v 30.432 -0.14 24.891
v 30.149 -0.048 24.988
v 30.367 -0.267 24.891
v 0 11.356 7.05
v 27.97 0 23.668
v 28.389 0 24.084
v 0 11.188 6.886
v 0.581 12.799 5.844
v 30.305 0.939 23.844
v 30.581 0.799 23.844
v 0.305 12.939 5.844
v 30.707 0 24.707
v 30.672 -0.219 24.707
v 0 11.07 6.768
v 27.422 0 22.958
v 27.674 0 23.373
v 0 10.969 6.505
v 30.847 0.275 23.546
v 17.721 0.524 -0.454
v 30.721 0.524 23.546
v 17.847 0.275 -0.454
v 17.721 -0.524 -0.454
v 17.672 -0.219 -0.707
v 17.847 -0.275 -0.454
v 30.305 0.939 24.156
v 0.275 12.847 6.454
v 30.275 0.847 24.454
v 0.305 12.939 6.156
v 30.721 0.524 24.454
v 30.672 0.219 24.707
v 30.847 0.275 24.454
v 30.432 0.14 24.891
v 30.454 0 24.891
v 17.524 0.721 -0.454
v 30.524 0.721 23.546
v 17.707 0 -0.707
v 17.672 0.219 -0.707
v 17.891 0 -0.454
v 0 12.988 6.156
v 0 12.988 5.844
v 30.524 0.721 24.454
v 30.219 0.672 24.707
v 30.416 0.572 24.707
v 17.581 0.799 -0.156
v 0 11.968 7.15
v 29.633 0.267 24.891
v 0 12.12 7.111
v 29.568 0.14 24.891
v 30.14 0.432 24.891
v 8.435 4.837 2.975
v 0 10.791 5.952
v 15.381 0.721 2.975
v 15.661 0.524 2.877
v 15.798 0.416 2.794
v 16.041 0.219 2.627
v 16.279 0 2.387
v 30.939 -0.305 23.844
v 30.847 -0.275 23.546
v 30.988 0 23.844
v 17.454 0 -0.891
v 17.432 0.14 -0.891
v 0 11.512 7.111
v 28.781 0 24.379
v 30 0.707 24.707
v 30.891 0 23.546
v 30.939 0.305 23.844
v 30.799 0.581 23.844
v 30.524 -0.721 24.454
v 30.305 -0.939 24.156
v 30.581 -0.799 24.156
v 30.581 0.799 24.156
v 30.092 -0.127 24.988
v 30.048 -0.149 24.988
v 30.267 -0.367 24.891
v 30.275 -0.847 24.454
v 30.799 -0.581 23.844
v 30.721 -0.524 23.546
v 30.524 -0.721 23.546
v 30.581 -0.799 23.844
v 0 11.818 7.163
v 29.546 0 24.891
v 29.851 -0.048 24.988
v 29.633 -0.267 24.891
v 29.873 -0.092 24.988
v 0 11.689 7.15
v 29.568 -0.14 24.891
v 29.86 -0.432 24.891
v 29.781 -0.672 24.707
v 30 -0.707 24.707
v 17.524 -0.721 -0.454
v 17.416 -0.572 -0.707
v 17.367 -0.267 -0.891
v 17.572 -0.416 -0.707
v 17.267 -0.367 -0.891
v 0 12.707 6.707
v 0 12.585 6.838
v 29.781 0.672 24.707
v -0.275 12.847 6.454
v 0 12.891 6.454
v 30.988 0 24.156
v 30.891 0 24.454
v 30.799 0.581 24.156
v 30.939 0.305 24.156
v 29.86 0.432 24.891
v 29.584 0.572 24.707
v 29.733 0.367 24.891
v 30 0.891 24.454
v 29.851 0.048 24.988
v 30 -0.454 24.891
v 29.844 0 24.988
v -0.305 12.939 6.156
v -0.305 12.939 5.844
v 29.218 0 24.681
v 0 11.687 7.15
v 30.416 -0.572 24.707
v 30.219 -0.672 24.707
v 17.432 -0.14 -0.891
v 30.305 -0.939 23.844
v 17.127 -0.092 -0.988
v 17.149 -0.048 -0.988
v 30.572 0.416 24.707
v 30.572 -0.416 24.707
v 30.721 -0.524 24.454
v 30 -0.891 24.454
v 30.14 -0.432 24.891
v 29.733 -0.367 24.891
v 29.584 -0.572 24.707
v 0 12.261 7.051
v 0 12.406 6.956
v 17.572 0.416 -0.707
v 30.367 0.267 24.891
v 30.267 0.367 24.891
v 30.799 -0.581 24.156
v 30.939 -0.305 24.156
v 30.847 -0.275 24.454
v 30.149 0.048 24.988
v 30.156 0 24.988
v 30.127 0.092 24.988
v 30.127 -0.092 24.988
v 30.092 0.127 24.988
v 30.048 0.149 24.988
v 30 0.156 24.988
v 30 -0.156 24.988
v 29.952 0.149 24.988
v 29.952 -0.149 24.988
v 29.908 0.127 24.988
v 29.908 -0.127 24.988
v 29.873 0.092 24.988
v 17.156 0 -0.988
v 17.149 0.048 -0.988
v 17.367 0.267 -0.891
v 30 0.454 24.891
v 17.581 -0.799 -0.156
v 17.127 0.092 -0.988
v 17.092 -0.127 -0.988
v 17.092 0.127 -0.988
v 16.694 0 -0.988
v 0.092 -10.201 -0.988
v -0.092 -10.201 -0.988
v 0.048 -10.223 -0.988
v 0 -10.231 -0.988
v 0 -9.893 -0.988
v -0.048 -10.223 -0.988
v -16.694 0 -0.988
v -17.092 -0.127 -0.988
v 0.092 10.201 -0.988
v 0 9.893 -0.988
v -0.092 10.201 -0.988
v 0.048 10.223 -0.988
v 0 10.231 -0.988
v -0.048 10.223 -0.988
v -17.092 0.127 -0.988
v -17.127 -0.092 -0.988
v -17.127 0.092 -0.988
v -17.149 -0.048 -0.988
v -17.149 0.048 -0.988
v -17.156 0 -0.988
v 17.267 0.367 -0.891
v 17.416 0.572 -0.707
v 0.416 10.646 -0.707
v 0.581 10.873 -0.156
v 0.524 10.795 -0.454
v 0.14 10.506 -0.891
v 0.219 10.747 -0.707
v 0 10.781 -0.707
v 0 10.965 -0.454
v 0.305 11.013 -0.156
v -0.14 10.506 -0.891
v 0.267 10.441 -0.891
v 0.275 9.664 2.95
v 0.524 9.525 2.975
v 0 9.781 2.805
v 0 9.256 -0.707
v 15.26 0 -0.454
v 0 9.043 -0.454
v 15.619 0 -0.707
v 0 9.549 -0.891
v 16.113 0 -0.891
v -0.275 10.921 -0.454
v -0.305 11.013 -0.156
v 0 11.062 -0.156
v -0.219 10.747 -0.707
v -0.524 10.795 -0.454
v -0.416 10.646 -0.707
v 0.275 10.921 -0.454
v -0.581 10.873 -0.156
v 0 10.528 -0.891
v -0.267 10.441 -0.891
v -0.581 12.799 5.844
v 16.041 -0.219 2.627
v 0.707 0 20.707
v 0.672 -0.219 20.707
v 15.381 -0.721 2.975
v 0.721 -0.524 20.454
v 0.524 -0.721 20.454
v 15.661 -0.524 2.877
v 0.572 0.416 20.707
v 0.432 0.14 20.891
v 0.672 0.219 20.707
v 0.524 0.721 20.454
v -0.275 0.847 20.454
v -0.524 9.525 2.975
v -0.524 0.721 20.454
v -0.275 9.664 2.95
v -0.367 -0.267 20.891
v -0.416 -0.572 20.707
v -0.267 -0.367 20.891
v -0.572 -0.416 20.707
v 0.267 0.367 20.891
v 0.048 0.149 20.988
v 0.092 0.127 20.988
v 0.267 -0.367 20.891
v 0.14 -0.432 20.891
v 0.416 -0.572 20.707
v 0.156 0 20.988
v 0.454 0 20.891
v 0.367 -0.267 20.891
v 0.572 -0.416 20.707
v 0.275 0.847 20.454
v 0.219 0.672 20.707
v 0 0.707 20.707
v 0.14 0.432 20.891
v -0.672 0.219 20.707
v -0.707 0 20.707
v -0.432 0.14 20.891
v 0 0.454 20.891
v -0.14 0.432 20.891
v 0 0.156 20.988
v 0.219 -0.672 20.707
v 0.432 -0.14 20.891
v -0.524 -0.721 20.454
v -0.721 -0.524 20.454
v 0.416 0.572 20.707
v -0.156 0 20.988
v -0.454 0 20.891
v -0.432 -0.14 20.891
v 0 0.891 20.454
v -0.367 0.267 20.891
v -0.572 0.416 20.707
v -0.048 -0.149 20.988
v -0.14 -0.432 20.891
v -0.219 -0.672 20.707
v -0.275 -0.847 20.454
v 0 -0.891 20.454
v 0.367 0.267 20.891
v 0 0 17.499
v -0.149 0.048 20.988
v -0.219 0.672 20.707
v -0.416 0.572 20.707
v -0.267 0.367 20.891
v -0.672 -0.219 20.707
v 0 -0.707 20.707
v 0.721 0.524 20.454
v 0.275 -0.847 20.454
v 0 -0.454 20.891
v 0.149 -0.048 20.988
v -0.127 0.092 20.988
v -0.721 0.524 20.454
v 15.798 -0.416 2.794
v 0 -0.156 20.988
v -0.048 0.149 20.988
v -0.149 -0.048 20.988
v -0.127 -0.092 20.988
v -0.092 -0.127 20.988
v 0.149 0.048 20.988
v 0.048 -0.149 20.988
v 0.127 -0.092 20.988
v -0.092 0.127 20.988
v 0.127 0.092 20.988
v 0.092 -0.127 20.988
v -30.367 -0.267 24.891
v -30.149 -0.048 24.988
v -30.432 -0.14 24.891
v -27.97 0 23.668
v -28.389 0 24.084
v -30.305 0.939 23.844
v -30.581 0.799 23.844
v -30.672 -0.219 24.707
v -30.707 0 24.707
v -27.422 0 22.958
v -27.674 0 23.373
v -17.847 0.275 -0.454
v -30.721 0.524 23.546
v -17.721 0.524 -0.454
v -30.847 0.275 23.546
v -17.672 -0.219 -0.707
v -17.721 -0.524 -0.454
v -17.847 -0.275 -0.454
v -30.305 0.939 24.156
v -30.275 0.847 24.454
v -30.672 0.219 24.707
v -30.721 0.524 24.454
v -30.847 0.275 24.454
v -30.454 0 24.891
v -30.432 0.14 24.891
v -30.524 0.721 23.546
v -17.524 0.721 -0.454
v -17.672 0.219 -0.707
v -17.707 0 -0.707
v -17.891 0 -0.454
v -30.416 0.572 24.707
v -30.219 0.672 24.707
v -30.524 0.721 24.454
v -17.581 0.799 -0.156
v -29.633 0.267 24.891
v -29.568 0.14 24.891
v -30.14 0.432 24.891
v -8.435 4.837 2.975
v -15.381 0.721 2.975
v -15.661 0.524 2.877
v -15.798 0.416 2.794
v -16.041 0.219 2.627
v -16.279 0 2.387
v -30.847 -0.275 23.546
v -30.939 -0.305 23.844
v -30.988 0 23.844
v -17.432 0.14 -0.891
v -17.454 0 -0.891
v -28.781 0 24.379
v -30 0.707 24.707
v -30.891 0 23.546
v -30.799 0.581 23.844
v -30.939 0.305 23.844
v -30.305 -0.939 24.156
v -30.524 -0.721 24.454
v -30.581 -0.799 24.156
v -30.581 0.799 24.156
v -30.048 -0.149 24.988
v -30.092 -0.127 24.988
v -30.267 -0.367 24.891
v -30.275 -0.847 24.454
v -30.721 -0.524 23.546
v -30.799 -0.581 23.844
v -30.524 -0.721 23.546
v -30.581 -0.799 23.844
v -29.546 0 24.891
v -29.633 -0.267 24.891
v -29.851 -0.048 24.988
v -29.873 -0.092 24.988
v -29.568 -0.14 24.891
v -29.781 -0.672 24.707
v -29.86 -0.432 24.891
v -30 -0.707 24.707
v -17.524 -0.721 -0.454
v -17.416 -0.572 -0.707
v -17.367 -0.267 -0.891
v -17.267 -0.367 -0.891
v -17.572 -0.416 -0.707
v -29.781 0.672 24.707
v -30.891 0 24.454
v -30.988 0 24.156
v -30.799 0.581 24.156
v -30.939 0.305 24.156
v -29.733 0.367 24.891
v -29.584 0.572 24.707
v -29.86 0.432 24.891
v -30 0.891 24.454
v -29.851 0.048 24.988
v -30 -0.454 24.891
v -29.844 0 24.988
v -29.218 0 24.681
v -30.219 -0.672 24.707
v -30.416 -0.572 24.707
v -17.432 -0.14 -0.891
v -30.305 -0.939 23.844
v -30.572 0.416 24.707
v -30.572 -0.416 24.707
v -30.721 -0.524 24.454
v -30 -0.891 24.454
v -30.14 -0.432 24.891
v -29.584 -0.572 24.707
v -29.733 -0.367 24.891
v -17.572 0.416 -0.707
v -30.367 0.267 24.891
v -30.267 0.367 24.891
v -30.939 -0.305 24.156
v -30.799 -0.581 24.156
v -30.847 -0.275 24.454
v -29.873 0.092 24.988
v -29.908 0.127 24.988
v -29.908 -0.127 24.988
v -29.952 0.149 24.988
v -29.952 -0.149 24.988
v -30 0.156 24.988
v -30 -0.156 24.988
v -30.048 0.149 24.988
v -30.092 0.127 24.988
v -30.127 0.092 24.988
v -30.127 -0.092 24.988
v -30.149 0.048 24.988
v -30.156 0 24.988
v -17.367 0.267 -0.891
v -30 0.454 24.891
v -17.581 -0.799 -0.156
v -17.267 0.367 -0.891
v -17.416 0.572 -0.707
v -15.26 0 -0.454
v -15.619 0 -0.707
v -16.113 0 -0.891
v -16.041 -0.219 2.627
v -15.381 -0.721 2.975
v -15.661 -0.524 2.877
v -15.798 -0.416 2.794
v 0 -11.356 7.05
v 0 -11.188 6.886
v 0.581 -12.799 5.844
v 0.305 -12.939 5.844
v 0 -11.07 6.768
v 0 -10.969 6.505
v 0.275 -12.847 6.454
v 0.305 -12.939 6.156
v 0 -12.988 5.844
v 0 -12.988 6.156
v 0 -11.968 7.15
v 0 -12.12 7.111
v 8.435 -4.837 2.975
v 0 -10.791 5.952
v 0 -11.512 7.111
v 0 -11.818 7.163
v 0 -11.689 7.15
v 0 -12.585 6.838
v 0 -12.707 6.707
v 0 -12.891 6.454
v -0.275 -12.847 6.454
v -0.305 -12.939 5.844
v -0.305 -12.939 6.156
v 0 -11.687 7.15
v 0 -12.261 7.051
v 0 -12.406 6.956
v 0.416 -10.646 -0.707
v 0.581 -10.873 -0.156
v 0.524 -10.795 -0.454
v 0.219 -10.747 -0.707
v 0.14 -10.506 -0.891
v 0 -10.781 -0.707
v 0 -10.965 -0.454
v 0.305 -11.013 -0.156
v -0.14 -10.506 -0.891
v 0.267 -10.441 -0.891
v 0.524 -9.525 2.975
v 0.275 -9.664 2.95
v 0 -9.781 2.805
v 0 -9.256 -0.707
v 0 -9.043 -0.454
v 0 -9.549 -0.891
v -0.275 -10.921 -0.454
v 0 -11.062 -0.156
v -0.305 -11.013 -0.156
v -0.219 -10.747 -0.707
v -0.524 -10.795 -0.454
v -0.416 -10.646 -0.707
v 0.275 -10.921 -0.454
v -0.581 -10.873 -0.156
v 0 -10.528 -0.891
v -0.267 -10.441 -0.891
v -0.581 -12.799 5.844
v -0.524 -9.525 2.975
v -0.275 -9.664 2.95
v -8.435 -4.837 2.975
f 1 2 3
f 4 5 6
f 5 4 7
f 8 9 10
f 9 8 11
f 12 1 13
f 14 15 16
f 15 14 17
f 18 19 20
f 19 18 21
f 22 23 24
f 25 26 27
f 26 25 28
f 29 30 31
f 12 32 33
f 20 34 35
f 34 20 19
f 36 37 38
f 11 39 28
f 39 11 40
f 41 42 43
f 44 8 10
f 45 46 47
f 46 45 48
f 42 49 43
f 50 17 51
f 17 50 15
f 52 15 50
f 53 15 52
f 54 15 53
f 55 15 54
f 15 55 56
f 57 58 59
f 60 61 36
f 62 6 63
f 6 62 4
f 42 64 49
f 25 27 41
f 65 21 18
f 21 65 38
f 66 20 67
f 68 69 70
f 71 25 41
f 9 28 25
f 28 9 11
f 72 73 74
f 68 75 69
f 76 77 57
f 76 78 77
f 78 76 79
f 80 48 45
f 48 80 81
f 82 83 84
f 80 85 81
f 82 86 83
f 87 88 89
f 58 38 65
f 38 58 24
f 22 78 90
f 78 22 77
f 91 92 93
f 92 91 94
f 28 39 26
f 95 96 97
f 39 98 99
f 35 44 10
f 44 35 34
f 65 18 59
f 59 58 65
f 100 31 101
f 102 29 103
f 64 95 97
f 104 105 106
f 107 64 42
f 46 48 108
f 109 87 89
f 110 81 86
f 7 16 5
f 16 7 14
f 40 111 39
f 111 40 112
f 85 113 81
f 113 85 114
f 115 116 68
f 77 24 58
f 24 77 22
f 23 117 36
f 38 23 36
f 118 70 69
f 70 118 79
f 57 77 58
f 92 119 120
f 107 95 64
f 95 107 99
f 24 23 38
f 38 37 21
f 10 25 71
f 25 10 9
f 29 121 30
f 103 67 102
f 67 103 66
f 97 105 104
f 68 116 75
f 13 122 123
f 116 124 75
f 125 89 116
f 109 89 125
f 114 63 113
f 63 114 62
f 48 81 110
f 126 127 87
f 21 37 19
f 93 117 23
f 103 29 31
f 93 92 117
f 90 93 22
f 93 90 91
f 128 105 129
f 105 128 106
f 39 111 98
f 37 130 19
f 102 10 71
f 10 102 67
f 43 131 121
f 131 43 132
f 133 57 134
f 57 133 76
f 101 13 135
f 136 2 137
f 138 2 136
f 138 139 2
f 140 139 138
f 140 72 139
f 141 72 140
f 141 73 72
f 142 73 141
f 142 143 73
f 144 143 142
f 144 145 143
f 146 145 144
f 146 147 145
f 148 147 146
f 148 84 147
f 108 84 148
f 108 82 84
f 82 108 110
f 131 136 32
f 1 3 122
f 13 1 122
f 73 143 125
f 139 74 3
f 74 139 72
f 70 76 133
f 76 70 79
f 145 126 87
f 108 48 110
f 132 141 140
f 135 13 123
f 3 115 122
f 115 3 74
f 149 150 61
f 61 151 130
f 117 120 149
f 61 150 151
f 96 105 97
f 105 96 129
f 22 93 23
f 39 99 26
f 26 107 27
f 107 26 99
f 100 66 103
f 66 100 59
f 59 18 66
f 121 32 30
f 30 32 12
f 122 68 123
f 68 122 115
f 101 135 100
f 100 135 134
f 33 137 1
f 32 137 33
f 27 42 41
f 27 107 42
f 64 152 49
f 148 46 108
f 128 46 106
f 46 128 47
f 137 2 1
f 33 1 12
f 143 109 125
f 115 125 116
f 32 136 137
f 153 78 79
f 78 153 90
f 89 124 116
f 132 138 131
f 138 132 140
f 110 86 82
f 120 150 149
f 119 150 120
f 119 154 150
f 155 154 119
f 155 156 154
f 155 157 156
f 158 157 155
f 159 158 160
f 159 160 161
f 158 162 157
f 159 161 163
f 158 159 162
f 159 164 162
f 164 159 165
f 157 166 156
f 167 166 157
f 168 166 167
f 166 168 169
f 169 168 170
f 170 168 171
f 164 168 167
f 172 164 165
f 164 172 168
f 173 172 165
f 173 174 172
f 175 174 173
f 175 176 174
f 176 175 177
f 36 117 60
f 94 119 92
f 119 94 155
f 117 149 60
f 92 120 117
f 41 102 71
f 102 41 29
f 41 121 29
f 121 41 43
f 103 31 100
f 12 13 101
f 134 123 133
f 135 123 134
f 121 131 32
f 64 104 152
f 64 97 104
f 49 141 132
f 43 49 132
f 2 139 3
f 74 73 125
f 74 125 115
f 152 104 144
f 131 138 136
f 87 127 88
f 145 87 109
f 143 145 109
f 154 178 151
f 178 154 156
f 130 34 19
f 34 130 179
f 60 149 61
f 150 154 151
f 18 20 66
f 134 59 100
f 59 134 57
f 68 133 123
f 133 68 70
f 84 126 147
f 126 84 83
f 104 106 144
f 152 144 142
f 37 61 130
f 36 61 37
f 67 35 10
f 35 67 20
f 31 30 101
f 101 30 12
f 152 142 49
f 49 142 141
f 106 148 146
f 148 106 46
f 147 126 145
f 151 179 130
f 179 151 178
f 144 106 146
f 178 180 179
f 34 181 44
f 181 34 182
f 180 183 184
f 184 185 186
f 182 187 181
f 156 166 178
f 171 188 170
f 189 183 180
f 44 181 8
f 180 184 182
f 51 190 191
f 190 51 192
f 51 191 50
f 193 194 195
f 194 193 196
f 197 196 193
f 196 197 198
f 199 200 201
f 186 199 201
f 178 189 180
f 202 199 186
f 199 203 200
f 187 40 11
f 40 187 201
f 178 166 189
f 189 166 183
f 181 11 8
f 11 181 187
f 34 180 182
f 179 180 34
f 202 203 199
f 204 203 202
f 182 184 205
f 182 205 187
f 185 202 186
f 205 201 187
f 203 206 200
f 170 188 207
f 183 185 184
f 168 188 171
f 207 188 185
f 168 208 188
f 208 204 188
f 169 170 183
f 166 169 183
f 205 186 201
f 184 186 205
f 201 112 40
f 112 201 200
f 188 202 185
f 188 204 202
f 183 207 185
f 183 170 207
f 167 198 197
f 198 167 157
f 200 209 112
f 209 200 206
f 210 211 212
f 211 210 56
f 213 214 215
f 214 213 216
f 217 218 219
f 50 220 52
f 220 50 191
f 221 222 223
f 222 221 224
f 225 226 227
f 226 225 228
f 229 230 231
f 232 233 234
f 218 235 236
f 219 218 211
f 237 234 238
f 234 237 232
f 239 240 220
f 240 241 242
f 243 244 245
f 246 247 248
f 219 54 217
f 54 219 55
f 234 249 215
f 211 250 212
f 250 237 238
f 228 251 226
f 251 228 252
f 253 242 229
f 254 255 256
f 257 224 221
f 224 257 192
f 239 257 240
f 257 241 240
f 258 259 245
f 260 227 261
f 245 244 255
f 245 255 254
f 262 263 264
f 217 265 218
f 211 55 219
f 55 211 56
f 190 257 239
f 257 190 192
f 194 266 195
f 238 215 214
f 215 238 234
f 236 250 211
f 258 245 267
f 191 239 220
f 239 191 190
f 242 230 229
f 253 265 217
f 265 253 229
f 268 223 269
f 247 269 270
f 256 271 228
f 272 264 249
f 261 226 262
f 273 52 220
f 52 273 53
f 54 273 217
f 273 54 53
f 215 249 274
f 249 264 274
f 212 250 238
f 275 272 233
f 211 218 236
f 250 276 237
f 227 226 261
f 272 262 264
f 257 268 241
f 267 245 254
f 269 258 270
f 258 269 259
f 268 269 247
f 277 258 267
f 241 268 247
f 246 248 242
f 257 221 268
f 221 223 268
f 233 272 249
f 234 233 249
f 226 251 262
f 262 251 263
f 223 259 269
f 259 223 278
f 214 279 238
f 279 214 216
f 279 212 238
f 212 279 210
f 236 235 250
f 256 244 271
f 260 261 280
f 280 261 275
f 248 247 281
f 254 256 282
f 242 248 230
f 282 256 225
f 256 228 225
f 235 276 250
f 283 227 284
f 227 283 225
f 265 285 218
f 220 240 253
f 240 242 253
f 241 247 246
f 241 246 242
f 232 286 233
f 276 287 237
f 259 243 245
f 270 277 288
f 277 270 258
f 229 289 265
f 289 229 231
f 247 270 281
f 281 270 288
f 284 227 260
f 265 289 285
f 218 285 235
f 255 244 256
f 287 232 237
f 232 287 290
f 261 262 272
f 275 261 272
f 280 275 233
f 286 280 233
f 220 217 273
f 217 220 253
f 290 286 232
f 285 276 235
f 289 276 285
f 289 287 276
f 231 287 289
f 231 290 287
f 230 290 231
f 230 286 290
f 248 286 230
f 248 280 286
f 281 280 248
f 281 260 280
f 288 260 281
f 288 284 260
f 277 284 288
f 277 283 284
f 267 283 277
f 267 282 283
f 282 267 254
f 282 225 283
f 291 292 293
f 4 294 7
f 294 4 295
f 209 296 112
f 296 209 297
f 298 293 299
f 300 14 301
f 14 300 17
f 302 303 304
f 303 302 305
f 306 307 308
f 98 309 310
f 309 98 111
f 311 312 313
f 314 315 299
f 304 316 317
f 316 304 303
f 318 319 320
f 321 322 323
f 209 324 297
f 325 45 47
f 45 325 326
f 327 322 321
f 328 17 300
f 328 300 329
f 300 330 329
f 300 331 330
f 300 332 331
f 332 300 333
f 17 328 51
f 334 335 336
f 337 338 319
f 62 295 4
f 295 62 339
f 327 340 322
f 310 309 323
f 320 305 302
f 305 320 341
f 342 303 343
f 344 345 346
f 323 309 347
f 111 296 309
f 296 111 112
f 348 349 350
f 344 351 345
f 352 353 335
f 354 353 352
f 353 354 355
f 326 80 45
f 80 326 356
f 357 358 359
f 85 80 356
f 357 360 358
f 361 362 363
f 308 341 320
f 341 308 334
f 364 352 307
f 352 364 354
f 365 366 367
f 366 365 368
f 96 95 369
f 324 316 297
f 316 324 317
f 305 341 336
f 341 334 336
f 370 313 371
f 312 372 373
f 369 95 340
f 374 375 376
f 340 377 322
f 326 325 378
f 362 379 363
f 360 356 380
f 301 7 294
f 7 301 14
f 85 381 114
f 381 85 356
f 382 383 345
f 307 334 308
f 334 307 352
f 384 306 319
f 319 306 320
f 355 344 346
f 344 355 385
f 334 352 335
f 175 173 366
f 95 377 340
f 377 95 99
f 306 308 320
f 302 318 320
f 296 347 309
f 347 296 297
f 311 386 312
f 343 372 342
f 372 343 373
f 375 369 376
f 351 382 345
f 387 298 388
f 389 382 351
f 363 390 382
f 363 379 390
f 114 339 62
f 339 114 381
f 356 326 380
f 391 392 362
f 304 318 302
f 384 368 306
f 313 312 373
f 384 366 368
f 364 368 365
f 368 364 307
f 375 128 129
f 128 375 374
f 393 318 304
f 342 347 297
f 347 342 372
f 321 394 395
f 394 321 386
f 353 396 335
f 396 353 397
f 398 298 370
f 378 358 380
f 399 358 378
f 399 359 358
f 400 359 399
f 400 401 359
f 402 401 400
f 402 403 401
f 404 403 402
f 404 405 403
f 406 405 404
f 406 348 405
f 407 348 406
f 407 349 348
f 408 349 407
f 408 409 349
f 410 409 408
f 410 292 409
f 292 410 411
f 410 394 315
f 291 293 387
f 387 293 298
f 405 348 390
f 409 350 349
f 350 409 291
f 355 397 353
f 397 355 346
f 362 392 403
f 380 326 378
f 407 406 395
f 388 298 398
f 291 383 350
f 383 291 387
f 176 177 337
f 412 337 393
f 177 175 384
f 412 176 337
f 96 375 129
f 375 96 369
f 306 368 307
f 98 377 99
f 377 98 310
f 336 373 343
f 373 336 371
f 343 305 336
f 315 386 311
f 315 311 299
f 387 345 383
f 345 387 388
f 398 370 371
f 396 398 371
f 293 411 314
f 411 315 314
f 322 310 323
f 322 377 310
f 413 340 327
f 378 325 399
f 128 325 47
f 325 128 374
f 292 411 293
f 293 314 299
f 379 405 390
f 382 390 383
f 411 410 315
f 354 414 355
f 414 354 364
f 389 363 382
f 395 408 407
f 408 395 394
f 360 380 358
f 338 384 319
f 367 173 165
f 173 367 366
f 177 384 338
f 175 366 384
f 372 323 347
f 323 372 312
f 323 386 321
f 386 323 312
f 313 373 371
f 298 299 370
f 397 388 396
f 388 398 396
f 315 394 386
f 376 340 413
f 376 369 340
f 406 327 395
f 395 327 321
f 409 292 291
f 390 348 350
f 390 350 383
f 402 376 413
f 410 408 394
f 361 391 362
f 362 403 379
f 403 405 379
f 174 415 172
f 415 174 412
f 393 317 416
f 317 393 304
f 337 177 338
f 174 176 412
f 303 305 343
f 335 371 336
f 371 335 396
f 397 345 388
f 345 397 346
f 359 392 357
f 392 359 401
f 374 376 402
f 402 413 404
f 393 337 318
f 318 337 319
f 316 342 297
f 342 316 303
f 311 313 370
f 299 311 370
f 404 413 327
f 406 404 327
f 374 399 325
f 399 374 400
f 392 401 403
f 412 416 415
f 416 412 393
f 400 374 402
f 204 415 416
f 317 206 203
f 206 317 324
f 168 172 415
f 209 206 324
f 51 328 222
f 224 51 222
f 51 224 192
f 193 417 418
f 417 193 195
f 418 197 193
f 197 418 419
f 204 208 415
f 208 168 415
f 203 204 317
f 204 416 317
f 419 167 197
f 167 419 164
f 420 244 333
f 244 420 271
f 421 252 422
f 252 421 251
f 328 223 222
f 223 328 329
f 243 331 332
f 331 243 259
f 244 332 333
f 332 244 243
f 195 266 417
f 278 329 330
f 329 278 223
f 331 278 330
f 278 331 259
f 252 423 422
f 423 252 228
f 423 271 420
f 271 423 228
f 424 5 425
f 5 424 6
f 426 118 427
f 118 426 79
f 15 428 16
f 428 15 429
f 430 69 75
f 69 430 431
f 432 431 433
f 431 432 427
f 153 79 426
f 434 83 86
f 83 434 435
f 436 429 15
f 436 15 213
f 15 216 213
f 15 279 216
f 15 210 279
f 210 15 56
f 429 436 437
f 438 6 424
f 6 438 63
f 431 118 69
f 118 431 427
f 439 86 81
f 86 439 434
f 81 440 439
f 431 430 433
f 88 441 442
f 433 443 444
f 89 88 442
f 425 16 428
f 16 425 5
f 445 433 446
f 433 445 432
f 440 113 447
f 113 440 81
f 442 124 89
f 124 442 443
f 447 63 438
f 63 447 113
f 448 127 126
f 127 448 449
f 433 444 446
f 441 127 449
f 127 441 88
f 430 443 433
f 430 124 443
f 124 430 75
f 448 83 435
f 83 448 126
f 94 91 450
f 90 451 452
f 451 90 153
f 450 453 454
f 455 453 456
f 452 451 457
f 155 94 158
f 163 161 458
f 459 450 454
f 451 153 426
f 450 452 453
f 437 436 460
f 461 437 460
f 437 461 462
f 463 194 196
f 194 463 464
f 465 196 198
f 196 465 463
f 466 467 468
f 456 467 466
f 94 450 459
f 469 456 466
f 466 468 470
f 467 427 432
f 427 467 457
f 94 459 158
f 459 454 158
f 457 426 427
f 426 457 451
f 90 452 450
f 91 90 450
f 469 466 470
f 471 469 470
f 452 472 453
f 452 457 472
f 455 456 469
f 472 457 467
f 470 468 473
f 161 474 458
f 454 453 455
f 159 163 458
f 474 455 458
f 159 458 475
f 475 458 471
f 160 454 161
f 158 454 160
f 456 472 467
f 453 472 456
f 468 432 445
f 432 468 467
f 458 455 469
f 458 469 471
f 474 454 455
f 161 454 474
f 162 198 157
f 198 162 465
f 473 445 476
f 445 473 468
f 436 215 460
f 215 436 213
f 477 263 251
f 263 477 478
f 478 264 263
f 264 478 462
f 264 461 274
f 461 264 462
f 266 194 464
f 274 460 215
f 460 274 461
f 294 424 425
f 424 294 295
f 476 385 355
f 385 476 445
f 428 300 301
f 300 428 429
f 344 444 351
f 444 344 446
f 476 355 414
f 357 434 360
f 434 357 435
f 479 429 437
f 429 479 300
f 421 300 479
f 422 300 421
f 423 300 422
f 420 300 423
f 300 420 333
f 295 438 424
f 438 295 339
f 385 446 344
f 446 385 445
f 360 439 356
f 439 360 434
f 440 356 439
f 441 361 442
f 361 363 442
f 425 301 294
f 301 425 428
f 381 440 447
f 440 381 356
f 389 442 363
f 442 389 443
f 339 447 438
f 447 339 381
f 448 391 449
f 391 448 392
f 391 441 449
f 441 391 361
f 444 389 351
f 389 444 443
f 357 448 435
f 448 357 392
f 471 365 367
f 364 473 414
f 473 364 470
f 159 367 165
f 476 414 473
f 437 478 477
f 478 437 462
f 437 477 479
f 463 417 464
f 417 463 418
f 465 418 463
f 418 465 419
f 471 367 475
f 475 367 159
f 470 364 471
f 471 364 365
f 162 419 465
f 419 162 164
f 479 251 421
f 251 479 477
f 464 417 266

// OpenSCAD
/*
   origami ship
   straight sides
   
   Kit Wallace

*/
// length of bow from centre
lb=15; 
// height of bow
hb=12;
// width midships
wm=6; 
// height midships
hm=3; 
// waterline length e.g. from centre eg. half length of bow
wl=8.5; 
// width of hull from centre  - here this is computed so sides has no crease
// wh; 

// height of sail
h=10; 
//Thickness of paper
thickness=1;
// sphere quality
steps = 20;
// overall scale
scale=2;

module double(axis) { 
      union() {
          children();
          mirror(axis) children();
      }
  }
module plane(s,t=0.5) {
    hull()
    for (i=[0:len(s) -1])
       translate(s[i]) sphere(t/2);     
    } 

module ground(size=50) {
   translate([0,0,-size]) cube(2*size,center=true);
}

// functions to make 4 points coplanar - by computing the value of one value so that determinat of matri of 4 points is zero

function det4(m) =
// from http://www.euclideanspace.com/maths/algebra/matrix/functions/determinant/fourD/index.htm
    m[0][3] * m[1][2] * m[2][1] * m[3][0] - m[0][2] * m[1][3] * m[2][1] * m[3][0]- m[0][3] * m[1][1] * m[2][2] * m[3][0]+m[0][1] * m[1][3] * m[2][2] * m[3][0]+ m[0][2] * m[1][1] * m[2][3] * m[3][0]-m[0][1] * m[1][2] * m[2][3] * m[3][0]- m[0][3] * m[1][2] * m[2][0] * m[3][1]+m[0][2] * m[1][3] * m[2][0] * m[3][1]+ m[0][3] * m[1][0] * m[2][2] * m[3][1]-m[0][0] * m[1][3] * m[2][2] * m[3][1]- m[0][2] * m[1][0] * m[2][3] * m[3][1]+m[0][0] * m[1][2] * m[2][3] * m[3][1]+ m[0][3] * m[1][1] * m[2][0] * m[3][2]-m[0][1] * m[1][3] * m[2][0] * m[3][2]- m[0][3] * m[1][0] * m[2][1] * m[3][2]+m[0][0] * m[1][3] * m[2][1] * m[3][2]+ m[0][1] * m[1][0] * m[2][3] * m[3][2]-m[0][0] * m[1][1] * m[2][3] * m[3][2]- m[0][2] * m[1][1] * m[2][0] * m[3][3]+m[0][1] * m[1][2] * m[2][0] * m[3][3]+ m[0][2] * m[1][0] * m[2][1] * m[3][3]-m[0][0] * m[1][2] * m[2][1] * m[3][3]- m[0][1] * m[1][0] * m[2][2] * m[3][3]+m[0][0] * m[1][1] * m[2][2] * m[3][3];

// to iteratively solve det(x) = -
function secant(xn,xn1,eps=0.001) =
     let(fxn=f(xn))
     let(fxn1=f(xn1))
     let(x = xn - fxn*(xn - xn1)/ (fxn - fxn1))
     abs(f(x) - fxn) < eps
        ? x
        : secant(x,xn,eps);
 

p1=[lb,0,hb];
p2=[wl,0,0];
p3=[0,wm,hm];
p5=[0,0,h];

function f(x) = 
 let(m = [  
       [lb,0,hb,1],
       [wl,0,0,1],
       [0,wm,hm,1],
       [0,x,0,1]]
     )
  det4(m);
  
wh= secant(0,wm);
echo(wh);

p4=[0,wh,0];

module ship_q(t) {
   plane([p1,p2,p3],t);
   plane([p2,p3,p4],t);
   plane([p4,p2,p5],t);
};

$fn=steps;
scale(scale) 
 difference() {
  double([0,1,0]) 
     double([1,0,0]) 
         ship_q(thickness); 
 * ground();
 }
